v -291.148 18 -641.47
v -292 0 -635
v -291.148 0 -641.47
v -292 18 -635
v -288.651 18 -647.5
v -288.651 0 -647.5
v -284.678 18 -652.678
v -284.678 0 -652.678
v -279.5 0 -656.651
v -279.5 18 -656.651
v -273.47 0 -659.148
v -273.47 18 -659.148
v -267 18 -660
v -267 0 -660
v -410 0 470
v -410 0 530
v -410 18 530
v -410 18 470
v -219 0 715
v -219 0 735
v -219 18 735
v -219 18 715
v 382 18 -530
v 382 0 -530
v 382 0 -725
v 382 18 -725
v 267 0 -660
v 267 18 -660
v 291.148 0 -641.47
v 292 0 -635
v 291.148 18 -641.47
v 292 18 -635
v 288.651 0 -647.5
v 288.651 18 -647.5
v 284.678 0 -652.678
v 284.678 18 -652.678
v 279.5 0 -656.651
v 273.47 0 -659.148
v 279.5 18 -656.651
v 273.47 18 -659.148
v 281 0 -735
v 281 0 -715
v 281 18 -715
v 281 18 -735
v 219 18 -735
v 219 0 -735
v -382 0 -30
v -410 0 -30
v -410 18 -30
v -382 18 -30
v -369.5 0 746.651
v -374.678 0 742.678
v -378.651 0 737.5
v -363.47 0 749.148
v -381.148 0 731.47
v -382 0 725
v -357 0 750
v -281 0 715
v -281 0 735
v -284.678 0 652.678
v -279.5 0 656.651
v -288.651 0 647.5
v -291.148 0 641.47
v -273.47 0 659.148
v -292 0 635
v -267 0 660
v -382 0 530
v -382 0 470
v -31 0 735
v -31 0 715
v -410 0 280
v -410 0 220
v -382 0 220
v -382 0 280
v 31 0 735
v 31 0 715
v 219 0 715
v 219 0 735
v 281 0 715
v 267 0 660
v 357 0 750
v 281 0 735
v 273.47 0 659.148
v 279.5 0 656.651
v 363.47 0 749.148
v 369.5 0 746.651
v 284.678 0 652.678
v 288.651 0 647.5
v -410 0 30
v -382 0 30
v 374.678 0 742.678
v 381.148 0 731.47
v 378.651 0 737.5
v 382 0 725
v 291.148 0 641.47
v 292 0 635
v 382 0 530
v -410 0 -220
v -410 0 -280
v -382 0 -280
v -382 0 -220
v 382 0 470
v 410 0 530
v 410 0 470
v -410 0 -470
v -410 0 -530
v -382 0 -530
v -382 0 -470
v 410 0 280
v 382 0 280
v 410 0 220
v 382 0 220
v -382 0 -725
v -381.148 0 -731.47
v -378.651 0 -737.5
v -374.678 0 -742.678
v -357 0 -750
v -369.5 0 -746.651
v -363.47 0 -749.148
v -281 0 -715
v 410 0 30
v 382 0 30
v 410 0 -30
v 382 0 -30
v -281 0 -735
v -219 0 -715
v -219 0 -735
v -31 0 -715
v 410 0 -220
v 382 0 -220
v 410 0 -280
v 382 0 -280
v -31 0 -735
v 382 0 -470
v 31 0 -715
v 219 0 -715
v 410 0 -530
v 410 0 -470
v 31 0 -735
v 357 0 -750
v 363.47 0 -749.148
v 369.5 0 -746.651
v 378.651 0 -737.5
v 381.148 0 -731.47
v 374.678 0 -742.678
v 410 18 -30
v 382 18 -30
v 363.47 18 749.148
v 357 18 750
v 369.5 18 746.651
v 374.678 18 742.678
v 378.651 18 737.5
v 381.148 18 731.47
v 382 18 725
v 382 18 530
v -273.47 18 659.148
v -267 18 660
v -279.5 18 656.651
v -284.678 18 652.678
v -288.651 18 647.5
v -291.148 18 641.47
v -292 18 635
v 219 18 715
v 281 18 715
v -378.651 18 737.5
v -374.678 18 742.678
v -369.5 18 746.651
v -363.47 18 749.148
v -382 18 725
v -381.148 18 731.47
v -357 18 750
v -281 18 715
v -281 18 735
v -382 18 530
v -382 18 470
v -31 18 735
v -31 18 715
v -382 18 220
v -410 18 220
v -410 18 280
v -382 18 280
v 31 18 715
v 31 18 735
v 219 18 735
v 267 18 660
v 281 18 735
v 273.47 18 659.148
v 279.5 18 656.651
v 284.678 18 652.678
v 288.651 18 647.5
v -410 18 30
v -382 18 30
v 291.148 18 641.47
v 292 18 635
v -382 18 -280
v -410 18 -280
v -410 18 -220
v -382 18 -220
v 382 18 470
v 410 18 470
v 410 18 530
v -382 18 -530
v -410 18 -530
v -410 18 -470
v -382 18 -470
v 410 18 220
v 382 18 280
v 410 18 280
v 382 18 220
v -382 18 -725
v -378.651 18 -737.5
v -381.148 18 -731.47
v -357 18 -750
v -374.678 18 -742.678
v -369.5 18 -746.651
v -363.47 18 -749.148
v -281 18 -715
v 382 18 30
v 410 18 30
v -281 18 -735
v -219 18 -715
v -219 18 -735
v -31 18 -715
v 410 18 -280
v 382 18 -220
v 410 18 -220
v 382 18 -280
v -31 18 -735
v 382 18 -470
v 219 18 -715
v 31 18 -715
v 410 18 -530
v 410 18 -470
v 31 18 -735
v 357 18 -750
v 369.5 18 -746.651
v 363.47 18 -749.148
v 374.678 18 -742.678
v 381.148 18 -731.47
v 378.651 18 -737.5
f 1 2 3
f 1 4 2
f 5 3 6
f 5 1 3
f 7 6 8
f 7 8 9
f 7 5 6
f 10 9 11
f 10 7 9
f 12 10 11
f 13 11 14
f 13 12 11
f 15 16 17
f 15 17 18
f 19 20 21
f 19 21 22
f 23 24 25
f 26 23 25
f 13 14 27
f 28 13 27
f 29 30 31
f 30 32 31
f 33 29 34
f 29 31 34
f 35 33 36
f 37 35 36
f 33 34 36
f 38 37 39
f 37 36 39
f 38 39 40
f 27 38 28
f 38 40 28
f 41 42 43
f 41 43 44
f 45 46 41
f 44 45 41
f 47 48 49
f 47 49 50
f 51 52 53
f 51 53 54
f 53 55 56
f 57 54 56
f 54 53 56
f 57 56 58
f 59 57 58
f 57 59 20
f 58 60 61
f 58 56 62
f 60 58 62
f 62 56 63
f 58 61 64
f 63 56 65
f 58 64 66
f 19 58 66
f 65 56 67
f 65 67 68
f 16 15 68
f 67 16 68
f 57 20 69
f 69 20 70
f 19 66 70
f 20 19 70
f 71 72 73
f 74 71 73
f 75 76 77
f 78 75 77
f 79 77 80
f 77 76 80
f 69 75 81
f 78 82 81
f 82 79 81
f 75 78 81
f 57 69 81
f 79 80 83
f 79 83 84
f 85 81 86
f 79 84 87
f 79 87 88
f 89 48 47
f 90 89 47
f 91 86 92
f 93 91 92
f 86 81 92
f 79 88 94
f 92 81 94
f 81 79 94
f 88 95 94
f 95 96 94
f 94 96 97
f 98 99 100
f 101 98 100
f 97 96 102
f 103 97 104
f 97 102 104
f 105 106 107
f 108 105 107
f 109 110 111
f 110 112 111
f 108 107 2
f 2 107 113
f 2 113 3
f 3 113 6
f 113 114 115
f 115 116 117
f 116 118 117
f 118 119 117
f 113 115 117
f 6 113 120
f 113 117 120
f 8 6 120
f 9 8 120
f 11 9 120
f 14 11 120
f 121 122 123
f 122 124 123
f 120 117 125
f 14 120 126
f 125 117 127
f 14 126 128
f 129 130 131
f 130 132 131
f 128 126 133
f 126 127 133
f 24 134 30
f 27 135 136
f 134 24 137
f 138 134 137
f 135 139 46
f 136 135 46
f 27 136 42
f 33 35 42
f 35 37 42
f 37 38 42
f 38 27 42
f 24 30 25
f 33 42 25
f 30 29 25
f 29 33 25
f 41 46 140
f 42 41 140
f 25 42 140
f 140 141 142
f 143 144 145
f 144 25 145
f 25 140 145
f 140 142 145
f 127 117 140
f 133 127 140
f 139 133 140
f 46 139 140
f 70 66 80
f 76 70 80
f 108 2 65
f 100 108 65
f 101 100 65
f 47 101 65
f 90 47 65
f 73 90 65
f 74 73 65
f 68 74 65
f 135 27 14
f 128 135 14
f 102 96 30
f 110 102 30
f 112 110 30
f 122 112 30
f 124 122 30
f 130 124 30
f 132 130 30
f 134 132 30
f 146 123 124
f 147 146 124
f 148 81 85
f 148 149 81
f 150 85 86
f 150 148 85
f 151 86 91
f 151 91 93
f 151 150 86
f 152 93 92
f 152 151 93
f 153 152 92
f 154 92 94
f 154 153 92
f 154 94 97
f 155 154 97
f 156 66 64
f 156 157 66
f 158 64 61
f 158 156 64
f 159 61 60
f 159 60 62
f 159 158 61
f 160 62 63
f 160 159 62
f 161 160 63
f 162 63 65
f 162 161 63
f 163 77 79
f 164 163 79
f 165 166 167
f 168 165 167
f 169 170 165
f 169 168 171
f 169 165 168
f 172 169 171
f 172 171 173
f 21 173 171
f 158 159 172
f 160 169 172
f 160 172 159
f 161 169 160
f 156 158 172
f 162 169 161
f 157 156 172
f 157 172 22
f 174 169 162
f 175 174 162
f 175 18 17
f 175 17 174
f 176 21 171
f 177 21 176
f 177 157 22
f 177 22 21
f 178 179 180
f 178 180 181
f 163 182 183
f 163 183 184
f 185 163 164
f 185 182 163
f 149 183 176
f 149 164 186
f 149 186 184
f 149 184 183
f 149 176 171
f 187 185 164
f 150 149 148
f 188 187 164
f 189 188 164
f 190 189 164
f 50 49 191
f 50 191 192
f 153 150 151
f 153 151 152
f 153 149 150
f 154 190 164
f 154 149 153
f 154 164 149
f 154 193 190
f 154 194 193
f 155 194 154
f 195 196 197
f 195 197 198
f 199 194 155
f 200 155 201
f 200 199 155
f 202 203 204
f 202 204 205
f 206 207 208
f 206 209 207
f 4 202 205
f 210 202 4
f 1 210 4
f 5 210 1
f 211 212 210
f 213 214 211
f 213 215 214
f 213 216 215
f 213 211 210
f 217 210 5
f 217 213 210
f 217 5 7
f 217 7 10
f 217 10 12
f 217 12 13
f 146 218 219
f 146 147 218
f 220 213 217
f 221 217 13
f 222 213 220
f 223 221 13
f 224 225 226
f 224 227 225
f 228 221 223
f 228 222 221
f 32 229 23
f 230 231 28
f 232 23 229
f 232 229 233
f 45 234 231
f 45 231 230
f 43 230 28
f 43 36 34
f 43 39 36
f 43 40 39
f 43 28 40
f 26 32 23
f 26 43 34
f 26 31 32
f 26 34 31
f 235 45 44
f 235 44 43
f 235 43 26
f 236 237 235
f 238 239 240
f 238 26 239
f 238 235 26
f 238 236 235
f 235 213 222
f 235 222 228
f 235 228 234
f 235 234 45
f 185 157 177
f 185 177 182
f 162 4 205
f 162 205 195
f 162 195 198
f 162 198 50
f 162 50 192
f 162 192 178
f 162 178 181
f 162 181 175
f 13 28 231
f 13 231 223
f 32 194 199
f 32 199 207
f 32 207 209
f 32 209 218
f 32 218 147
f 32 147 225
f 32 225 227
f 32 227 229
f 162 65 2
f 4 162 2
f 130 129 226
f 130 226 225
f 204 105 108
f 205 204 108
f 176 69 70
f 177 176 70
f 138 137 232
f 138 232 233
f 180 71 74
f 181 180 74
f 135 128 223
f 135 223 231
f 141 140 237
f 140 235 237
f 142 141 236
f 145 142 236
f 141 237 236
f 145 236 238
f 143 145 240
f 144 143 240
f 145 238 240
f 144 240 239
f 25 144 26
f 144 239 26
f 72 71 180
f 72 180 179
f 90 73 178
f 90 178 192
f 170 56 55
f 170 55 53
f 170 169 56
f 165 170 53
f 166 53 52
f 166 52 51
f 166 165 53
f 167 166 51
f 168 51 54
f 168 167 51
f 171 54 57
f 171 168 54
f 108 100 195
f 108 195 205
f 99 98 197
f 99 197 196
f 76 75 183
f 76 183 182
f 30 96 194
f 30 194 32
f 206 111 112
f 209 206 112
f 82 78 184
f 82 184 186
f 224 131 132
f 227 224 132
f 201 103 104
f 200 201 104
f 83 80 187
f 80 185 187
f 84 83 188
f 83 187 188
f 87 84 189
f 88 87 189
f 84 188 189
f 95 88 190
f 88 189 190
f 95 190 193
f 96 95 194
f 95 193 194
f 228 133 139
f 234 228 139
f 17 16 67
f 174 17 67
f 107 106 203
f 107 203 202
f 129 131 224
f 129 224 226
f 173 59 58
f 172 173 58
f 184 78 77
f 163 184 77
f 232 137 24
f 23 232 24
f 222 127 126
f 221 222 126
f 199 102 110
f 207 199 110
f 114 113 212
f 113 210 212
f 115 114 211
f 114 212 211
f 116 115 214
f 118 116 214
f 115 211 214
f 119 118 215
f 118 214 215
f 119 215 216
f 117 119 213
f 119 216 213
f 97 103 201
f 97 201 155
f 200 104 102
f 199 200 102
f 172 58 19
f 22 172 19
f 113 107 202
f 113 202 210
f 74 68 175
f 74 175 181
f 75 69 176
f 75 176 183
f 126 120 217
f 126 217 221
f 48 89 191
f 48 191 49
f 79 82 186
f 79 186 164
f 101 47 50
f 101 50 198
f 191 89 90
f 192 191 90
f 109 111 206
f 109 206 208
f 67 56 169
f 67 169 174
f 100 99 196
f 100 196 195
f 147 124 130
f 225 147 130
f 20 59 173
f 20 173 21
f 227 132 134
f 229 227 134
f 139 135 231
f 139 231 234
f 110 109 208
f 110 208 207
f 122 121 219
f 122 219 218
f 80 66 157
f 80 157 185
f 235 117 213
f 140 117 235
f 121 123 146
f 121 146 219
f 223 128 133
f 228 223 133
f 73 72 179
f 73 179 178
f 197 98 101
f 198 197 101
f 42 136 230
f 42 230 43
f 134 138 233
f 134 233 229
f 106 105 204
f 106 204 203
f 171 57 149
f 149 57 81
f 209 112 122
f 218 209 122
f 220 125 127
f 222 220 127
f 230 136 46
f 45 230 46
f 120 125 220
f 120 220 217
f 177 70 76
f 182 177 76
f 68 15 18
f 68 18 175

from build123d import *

# Parameters (mm, degrees)
SKETCH_1_W               = 764
SKETCH_1_H               = 1500
SKETCH_1_W_2             = 584
SKETCH_1_H_2             = 1320
EXTRUDE_1_DEPTH          = 18
SKETCH_1_3_W             = 28
SKETCH_1_3_H             = 60
EXTRUDE_2_DEPTH          = 18
PATTERN_LINEAR_1_COUNT   = 5
PATTERN_LINEAR_1_PITCH   = 250
MIRROR_1_COPY_1_SKETCH_W = 28
MIRROR_1_COPY_1_SKETCH_H = 60
MIRROR_1_COPY_1_DEPTH    = 18
MIRROR_1_COPY_2_SKETCH_W = 28
MIRROR_1_COPY_2_SKETCH_H = 60
MIRROR_1_COPY_2_DEPTH    = 18
MIRROR_1_COPY_3_SKETCH_W = 28
MIRROR_1_COPY_3_SKETCH_H = 60
MIRROR_1_COPY_3_DEPTH    = 18
MIRROR_1_COPY_4_SKETCH_W = 28
MIRROR_1_COPY_4_SKETCH_H = 60
MIRROR_1_COPY_4_DEPTH    = 18
SKETCH_1_4_W             = 62
SKETCH_1_4_H             = 20
CUT_EXTRUDE_1_DEPTH      = 855.940933632
PATTERN_LINEAR_2_COUNT   = 3
PATTERN_LINEAR_2_PITCH   = 250
MIRROR_2_COPY_1_SKETCH_W = 62
MIRROR_2_COPY_1_SKETCH_H = 20
MIRROR_2_COPY_1_DEPTH    = 855.940933632
MIRROR_2_COPY_2_SKETCH_W = 62
MIRROR_2_COPY_2_SKETCH_H = 20
MIRROR_2_COPY_2_DEPTH    = 855.940933632
FILLET_1_R               = 25
FILLET_2_R               = 25


with BuildPart() as part:
    # 草图1 → 凸台-拉伸1 (new body)
    with BuildSketch(Plane(origin=(0, 0, 0), x_dir=(1, 0, 0), z_dir=(0, 1, 0))):
        Rectangle(SKETCH_1_W, SKETCH_1_H)
        Rectangle(SKETCH_1_W_2, SKETCH_1_H_2, mode=Mode.SUBTRACT)
    extrude(amount=EXTRUDE_1_DEPTH)

    # 草图1<3> → 凸台-拉伸2 (add)
    with BuildSketch(Plane(origin=(0, 0, 0), x_dir=(1, 0, 0), z_dir=(0, 1, 0))):
        with Locations((-396, -500)):
            Rectangle(SKETCH_1_3_W, SKETCH_1_3_H)
    extrude_2 = extrude(amount=EXTRUDE_2_DEPTH)

    # 阵列(线性)1: 凸台-拉伸2 ×5
    with Locations(*[(0, 0, -i * PATTERN_LINEAR_1_PITCH) for i in range(1, PATTERN_LINEAR_1_COUNT)]):
        add(extrude_2)

    # 镜向1: 凸台-拉伸2 across plane
    add(extrude_2.mirror(Plane(origin=(0, 0, 0), x_dir=(0, 0, 1), z_dir=(1, 0, 0))))

    # 镜向1 copy 1 sketch → 镜向1 copy 1 (add)
    with BuildSketch(Plane(origin=(0, 0, -250), x_dir=(-1, 0, 0), z_dir=(0, 1, 0))):
        with Locations((-396, 500)):
            Rectangle(MIRROR_1_COPY_1_SKETCH_W, MIRROR_1_COPY_1_SKETCH_H)
    extrude(amount=MIRROR_1_COPY_1_DEPTH)

    # 镜向1 copy 2 sketch → 镜向1 copy 2 (add)
    with BuildSketch(Plane(origin=(0, 0, -500), x_dir=(-1, 0, 0), z_dir=(0, 1, 0))):
        with Locations((-396, 500)):
            Rectangle(MIRROR_1_COPY_2_SKETCH_W, MIRROR_1_COPY_2_SKETCH_H)
    extrude(amount=MIRROR_1_COPY_2_DEPTH)

    # 镜向1 copy 3 sketch → 镜向1 copy 3 (add)
    with BuildSketch(Plane(origin=(0, 0, -750), x_dir=(-1, 0, 0), z_dir=(0, 1, 0))):
        with Locations((-396, 500)):
            Rectangle(MIRROR_1_COPY_3_SKETCH_W, MIRROR_1_COPY_3_SKETCH_H)
    extrude(amount=MIRROR_1_COPY_3_DEPTH)

    # 镜向1 copy 4 sketch → 镜向1 copy 4 (add)
    with BuildSketch(Plane(origin=(0, 0, -1000), x_dir=(-1, 0, 0), z_dir=(0, 1, 0))):
        with Locations((-396, 500)):
            Rectangle(MIRROR_1_COPY_4_SKETCH_W, MIRROR_1_COPY_4_SKETCH_H)
    extrude(amount=MIRROR_1_COPY_4_DEPTH)

    # 草图1<4> → 切除-拉伸1 (cut, through all)
    with BuildSketch(Plane(origin=(0, 0, 0), x_dir=(1, 0, 0), z_dir=(0, 1, 0))):
        with Locations((-250, -725)):
            Rectangle(SKETCH_1_4_W, SKETCH_1_4_H)
    cut_extrude_1 = extrude(amount=CUT_EXTRUDE_1_DEPTH, mode=Mode.SUBTRACT)

    # 阵列(线性)2: 切除-拉伸1 ×3
    with Locations(*[(i * PATTERN_LINEAR_2_PITCH, 0, 0) for i in range(1, PATTERN_LINEAR_2_COUNT)]):
        add(cut_extrude_1, mode=Mode.SUBTRACT)

    # 镜向2: 切除-拉伸1 across plane
    add(cut_extrude_1.mirror(Plane.XY), mode=Mode.SUBTRACT)

    # 镜向2 copy 1 sketch → 镜向2 copy 1 (cut, through all)
    with BuildSketch(Plane(origin=(250, 0, 0), x_dir=(1, 0, 0), z_dir=(0, 1, 0))):
        with Locations((-250, 725)):
            Rectangle(MIRROR_2_COPY_1_SKETCH_W, MIRROR_2_COPY_1_SKETCH_H)
    extrude(amount=MIRROR_2_COPY_1_DEPTH, mode=Mode.SUBTRACT)

    # 镜向2 copy 2 sketch → 镜向2 copy 2 (cut, through all)
    with BuildSketch(Plane(origin=(500, 0, 0), x_dir=(1, 0, 0), z_dir=(0, 1, 0))):
        with Locations((-250, 725)):
            Rectangle(MIRROR_2_COPY_2_SKETCH_W, MIRROR_2_COPY_2_SKETCH_H)
    extrude(amount=MIRROR_2_COPY_2_DEPTH, mode=Mode.SUBTRACT)

    # 圆角1
    fillet_1_edges = [part.edges().sort_by_distance(p)[0] for p in [
        (-382, 9, -750),
        (-382, 9, 750),
        (382, 9, 750),
        (382, 9, -750),
    ]]
    fillet(fillet_1_edges, radius=FILLET_1_R)

    # 圆角2
    fillet_2_edges = [part.edges().sort_by_distance(p)[0] for p in [
        (292, 9, -660),
        (-292, 9, -660),
        (-292, 9, 660),
        (292, 9, 660),
    ]]
    fillet(fillet_2_edges, radius=FILLET_2_R)


solid = part.part
